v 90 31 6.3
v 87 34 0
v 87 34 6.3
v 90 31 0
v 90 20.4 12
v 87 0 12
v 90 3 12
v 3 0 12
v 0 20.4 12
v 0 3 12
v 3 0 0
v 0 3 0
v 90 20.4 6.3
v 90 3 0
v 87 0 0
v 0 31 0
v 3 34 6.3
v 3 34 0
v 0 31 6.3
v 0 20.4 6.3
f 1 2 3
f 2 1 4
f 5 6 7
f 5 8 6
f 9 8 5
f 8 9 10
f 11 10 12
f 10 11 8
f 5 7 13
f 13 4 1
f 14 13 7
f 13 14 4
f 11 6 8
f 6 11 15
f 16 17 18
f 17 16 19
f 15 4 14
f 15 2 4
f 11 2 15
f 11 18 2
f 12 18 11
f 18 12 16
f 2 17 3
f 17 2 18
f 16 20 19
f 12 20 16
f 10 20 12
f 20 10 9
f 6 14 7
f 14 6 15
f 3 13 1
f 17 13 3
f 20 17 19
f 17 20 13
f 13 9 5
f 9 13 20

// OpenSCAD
$fn = 32;

// ----------------------------------------------------------------------
// Stepped bar: sidestep, 90 x 34 x 12/6.3 mm
// ----------------------------------------------------------------------

// --- parameters (mm) ---
bar_l = 90;               // bar length, X
bar_w = 34;               // bar width, Y
plate_t = 12;             // thickness of the thick zone, Z
thin_t = 6.3;             // thickness of the thin zone
corner_c = 3;             // corner chamfer of the bar
step_cut = 5.7;           // material removed from the thin zone
ledge_y = 20.4;           // start of the ledge from the front edge
depth_1 = 5.7;            // depth of cut 1 from the top face
fit_tol = 0.1;            // declared fit tolerance (prompt contract)
free_tol = 0.5;           // declared free tolerance (prompt contract)

profile = [[3, 0], [87, 0], [90, 3], [90, 31], [87, 34], [3, 34], [0, 31], [0, 3]];  // primary outline, 8 points, counter clockwise
void_1 = [[-1, 20.4], [91, 20.4], [91, 35], [-1, 35]];  // ledge cut along one edge, 4 points

// --- the one profile operation ---
difference() {
  linear_extrude(height = plate_t) polygon(points = profile);
  translate([0, 0, plate_t - depth_1])
    linear_extrude(height = depth_1 + 1) polygon(points = void_1);
}
